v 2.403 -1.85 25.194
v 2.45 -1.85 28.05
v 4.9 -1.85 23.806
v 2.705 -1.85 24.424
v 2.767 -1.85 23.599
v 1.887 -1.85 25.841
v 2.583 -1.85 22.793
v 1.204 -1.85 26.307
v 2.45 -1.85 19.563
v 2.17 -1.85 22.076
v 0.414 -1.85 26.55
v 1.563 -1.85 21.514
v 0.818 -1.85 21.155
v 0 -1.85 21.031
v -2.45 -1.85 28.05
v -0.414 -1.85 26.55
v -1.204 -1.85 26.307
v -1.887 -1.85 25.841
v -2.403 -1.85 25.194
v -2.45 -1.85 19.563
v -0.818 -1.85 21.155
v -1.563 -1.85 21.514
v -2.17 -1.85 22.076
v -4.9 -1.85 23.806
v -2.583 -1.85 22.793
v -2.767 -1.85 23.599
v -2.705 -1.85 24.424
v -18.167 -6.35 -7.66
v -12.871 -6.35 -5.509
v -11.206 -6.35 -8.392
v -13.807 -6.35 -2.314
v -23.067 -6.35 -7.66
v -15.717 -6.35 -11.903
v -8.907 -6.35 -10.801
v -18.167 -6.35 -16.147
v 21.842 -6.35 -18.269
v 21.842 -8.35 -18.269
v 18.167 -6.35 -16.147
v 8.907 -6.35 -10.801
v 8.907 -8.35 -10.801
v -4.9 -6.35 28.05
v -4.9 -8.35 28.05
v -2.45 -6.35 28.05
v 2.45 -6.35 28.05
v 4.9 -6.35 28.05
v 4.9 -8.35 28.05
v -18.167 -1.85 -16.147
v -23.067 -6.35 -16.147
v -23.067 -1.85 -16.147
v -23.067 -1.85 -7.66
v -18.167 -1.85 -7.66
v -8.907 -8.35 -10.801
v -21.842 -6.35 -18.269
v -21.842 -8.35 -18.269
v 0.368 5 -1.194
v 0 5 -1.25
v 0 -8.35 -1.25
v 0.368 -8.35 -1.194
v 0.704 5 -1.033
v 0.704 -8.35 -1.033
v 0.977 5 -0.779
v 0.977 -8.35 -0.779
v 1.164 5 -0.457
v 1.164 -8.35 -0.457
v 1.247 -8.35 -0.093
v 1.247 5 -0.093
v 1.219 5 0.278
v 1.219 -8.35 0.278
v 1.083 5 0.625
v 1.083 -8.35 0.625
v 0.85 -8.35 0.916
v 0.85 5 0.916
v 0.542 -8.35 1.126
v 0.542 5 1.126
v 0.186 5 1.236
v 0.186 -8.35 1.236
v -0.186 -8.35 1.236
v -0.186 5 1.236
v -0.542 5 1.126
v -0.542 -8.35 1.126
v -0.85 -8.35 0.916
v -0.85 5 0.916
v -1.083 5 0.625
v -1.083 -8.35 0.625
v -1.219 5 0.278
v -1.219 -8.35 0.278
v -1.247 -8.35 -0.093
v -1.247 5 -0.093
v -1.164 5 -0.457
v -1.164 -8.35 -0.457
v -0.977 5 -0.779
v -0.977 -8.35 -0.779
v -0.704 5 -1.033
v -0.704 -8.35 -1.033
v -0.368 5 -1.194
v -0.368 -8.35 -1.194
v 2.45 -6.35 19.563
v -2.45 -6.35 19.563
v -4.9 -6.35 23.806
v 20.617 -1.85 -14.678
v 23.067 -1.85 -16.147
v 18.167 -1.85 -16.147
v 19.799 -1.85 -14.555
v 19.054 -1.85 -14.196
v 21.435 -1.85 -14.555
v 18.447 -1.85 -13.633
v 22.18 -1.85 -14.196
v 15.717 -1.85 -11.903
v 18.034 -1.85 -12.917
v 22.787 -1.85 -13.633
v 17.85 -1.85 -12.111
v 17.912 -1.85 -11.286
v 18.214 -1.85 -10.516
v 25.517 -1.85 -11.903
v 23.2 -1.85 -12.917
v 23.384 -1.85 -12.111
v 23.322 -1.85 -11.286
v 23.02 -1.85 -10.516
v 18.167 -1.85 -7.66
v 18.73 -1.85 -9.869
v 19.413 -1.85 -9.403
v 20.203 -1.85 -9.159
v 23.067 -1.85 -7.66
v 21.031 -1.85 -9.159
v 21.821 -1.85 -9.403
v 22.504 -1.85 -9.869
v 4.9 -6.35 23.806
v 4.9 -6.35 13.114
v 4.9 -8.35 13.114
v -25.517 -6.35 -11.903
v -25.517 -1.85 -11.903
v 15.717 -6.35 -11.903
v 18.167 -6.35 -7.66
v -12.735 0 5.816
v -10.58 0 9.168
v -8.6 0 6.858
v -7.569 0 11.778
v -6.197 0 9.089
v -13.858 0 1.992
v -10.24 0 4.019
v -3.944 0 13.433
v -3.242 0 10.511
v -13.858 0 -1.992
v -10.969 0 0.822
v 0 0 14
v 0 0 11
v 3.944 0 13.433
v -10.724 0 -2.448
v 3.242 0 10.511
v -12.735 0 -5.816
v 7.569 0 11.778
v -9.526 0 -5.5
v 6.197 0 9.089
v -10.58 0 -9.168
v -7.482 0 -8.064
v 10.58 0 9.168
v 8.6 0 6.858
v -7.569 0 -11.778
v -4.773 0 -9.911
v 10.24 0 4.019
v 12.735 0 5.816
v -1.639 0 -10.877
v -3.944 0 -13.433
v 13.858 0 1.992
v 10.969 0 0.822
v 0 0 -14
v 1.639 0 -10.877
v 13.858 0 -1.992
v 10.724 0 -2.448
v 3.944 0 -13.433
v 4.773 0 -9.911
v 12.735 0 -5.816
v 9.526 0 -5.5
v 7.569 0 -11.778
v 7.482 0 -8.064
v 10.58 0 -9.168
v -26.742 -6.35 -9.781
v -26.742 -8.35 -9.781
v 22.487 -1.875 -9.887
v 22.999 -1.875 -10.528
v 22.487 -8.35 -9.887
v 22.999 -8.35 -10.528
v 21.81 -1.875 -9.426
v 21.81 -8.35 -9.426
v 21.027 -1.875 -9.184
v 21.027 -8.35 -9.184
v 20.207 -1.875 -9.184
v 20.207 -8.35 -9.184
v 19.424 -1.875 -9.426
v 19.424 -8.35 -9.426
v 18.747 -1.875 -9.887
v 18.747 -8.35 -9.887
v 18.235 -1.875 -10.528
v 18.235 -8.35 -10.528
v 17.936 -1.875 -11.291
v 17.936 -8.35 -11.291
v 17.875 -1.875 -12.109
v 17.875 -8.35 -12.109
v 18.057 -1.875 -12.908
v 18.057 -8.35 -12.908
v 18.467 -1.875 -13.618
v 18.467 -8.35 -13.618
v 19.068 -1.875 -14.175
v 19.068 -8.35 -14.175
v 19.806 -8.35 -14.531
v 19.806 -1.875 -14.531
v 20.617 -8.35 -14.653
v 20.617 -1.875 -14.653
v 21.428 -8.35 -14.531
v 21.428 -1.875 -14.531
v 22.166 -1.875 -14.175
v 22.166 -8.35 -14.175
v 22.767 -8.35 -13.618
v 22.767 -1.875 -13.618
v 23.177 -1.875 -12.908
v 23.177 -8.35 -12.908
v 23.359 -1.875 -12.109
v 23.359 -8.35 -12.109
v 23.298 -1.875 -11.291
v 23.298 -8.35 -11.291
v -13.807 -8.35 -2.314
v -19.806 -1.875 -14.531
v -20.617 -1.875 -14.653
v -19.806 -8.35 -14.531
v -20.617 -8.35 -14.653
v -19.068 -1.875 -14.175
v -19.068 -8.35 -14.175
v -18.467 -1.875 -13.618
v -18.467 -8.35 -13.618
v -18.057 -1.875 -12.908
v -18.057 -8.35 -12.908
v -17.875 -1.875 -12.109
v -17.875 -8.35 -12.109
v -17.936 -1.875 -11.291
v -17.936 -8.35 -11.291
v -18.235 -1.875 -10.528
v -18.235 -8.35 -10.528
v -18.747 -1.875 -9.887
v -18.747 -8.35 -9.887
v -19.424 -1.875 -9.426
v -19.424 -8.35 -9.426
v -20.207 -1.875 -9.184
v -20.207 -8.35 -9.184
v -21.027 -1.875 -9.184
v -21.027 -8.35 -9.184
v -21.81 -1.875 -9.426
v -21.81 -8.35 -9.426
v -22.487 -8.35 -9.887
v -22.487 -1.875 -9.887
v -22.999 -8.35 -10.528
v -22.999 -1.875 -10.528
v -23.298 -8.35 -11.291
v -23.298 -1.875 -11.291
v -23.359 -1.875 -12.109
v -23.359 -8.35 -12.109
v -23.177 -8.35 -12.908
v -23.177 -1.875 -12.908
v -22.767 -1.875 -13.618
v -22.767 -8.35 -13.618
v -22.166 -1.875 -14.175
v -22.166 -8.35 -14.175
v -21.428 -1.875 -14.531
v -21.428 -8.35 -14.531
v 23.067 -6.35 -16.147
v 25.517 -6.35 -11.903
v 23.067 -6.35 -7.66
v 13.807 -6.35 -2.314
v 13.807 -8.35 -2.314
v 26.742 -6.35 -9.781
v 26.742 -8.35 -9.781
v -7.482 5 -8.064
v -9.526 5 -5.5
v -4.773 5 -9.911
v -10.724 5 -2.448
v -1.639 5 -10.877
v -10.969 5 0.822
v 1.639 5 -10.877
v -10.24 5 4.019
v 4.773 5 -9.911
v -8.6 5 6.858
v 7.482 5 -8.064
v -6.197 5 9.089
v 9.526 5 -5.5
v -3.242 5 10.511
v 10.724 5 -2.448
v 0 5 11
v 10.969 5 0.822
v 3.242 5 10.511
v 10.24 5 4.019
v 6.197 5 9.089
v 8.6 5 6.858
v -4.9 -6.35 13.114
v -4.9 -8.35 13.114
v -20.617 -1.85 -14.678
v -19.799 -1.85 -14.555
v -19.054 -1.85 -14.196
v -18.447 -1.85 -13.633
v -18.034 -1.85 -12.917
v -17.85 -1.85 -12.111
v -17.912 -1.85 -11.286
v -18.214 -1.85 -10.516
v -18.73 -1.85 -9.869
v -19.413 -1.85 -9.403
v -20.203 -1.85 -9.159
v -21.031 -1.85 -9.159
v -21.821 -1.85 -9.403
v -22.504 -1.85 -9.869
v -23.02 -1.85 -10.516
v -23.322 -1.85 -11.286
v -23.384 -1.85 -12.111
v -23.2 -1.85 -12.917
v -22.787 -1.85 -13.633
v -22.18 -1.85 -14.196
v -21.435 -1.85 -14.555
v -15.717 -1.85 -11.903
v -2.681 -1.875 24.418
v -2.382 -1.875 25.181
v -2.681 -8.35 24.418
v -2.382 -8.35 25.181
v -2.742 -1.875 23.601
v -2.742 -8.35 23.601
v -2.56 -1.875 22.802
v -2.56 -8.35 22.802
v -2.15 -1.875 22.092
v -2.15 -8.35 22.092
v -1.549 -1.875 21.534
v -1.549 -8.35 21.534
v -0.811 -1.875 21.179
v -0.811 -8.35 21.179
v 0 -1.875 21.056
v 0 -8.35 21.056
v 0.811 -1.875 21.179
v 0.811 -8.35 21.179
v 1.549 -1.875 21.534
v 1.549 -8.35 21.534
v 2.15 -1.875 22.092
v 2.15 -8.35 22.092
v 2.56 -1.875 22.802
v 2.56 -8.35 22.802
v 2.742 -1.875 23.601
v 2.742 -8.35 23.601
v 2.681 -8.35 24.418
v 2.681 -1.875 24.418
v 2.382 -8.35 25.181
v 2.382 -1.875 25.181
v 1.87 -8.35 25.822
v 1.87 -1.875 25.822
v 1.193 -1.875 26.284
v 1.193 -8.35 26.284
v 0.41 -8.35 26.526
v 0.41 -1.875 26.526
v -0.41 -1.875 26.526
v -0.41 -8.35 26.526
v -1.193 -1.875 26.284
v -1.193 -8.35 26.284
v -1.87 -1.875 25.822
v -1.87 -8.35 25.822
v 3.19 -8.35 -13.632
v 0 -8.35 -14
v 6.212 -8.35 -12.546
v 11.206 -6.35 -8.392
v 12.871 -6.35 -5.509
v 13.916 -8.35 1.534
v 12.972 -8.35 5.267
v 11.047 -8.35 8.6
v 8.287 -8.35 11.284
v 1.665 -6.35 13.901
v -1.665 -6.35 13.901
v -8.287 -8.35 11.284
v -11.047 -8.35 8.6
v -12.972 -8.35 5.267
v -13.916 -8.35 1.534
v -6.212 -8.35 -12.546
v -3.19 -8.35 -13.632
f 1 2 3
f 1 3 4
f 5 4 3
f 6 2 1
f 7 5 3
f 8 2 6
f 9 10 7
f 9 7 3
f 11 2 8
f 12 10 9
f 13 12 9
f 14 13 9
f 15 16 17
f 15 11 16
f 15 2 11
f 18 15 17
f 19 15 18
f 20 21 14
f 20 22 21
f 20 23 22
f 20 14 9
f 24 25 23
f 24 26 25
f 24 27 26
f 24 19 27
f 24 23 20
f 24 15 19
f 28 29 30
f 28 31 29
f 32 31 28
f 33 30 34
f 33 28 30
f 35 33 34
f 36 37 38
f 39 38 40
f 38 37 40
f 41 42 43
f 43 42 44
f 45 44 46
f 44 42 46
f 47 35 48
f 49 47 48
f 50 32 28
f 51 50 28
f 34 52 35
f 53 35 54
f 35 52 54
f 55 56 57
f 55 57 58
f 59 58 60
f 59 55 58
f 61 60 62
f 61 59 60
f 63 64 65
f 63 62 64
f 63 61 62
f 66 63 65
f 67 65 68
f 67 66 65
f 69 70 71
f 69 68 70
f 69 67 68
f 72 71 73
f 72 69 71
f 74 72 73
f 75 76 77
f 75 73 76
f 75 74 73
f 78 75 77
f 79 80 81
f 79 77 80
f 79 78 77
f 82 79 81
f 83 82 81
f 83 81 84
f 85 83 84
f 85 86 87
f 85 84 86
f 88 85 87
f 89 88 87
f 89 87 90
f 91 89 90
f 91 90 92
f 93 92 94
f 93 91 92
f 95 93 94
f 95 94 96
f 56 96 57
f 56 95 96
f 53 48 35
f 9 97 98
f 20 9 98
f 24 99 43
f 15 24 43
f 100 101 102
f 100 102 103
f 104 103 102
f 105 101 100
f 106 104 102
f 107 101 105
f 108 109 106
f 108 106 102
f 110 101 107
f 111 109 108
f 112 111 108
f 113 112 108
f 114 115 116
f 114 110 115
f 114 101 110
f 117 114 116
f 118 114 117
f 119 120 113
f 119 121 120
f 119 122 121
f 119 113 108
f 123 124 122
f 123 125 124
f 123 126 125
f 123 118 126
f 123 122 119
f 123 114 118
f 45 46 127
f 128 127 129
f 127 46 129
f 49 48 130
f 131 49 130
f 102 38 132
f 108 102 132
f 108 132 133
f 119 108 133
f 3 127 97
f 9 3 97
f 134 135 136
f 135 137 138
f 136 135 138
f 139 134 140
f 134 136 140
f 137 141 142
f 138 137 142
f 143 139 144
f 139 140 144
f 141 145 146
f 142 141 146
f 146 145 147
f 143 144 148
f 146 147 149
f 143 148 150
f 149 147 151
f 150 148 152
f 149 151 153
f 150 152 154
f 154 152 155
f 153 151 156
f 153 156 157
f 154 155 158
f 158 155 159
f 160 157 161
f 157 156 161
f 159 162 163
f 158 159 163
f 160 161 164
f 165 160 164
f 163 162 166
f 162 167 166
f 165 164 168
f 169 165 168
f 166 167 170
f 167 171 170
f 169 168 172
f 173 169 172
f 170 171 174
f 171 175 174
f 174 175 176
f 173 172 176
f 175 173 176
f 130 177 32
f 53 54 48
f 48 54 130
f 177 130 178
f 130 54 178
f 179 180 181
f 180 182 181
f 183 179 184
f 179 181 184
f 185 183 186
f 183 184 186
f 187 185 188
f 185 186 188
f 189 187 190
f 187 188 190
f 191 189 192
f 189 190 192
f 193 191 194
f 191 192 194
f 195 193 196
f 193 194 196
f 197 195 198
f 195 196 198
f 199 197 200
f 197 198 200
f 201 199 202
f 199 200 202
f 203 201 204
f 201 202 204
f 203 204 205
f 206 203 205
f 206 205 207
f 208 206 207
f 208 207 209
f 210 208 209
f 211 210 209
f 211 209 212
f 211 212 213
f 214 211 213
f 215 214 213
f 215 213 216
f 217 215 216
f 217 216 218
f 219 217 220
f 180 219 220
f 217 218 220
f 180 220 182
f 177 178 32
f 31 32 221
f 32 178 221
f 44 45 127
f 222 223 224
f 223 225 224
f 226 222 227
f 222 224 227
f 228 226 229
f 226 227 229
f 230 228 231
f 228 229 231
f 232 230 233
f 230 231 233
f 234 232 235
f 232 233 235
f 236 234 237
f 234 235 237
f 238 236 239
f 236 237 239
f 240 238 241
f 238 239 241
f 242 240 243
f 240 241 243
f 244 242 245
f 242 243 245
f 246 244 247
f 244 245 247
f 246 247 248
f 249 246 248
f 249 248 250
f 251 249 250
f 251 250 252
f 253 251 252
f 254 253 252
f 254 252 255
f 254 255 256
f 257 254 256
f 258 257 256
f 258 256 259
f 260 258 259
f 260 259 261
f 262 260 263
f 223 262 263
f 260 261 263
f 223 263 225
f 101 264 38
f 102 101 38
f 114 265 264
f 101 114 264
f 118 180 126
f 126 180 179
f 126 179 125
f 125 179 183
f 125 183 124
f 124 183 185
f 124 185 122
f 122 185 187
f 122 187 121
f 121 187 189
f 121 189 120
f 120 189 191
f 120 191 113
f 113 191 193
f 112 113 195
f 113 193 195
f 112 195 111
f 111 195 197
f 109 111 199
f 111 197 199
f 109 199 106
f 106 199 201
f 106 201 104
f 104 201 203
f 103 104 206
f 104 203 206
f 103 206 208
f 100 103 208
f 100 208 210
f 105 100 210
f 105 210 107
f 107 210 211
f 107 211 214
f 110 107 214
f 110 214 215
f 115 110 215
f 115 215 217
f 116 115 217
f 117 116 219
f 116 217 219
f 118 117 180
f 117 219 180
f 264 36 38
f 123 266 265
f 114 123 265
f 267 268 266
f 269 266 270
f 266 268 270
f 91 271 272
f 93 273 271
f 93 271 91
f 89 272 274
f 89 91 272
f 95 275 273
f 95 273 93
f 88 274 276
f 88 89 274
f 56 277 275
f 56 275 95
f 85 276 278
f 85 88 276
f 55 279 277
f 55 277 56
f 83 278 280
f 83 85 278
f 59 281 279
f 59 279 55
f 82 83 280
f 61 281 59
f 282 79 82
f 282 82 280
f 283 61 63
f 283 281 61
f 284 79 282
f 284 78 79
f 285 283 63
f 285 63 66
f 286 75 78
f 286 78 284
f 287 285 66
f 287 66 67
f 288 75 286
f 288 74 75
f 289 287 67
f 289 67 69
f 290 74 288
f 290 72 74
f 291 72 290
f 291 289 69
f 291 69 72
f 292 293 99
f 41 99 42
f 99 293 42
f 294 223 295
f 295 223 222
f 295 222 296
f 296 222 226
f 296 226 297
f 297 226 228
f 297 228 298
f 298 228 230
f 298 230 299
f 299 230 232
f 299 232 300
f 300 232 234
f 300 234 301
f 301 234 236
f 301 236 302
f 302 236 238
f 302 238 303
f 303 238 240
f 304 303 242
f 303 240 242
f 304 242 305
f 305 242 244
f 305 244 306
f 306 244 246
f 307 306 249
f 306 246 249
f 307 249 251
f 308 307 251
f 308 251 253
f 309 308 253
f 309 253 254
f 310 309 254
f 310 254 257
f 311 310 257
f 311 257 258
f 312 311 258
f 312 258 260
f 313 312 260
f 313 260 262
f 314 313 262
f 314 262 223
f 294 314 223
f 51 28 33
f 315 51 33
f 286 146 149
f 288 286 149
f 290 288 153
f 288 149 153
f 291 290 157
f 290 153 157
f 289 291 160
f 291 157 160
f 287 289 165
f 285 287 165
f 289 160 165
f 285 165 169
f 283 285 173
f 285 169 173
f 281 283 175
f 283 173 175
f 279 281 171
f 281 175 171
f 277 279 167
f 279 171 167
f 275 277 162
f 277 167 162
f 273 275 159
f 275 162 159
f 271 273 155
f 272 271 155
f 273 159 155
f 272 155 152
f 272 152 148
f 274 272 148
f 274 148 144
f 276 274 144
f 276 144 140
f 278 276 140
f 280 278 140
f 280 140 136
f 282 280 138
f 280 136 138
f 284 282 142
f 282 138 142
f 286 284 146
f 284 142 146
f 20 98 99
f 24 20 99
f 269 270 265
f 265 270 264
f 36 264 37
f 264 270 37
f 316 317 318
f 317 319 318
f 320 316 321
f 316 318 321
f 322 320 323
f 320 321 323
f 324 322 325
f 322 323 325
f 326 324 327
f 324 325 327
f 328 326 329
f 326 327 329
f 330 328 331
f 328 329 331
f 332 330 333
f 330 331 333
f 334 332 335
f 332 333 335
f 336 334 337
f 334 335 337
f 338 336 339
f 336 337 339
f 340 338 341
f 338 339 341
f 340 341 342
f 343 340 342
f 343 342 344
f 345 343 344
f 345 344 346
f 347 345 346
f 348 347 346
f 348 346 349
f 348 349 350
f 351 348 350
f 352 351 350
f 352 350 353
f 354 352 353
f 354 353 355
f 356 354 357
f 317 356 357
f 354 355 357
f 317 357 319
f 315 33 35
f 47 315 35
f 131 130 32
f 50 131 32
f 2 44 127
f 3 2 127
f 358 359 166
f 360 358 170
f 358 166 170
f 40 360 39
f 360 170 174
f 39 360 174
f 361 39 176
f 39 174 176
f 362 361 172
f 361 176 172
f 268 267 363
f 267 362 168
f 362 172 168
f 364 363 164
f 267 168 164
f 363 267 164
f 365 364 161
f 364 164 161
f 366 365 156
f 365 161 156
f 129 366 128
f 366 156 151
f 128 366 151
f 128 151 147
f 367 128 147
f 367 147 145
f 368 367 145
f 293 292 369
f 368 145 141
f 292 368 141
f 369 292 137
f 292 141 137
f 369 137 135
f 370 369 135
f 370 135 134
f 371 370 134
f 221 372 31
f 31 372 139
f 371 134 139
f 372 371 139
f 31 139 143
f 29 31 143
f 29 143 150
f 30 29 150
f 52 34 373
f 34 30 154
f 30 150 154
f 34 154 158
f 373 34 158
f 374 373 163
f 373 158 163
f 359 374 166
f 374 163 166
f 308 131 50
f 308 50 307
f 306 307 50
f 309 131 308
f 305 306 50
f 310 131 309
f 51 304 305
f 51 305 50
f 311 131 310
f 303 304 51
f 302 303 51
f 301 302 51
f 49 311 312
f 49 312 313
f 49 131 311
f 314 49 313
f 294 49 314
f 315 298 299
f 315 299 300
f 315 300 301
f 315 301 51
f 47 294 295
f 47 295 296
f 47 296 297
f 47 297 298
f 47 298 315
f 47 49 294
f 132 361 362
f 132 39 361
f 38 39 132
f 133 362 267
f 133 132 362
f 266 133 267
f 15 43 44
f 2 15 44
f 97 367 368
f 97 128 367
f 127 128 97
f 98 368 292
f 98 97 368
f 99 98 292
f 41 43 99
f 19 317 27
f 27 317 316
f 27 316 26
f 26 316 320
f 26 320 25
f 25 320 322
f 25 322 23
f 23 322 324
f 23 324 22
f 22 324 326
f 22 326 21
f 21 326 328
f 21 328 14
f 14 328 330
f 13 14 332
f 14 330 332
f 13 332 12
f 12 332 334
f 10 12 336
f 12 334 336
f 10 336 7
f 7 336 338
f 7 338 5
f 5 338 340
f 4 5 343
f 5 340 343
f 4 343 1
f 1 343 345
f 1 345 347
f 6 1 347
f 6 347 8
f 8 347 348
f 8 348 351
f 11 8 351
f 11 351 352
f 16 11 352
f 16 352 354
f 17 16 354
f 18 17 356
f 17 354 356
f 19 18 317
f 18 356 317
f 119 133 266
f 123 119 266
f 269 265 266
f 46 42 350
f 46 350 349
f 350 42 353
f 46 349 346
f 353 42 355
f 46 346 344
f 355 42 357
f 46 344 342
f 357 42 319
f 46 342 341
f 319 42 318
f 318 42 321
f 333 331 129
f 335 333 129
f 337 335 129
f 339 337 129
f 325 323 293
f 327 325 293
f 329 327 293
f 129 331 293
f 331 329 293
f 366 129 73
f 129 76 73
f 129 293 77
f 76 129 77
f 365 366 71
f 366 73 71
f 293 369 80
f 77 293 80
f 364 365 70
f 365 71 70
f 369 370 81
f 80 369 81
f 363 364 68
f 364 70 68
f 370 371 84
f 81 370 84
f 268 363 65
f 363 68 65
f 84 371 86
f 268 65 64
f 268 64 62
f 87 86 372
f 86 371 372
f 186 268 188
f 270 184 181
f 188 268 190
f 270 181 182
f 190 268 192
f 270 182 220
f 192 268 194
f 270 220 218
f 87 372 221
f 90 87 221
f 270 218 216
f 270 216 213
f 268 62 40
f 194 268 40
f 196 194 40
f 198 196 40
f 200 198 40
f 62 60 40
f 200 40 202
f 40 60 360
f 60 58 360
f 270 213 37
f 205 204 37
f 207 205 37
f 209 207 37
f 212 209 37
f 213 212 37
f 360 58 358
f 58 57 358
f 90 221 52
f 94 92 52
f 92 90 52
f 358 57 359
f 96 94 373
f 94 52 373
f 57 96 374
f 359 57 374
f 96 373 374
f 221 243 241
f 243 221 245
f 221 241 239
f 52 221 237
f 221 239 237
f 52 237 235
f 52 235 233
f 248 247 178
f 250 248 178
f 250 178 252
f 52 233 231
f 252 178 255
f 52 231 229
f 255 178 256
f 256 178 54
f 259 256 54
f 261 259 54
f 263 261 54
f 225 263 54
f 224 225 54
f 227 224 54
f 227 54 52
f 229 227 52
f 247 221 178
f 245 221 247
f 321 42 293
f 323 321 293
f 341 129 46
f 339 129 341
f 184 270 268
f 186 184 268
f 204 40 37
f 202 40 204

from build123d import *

# Parameters (mm, degrees)
ESQUISSE1_R                  = 11
BOSS_EXTRU_1_DEPTH           = 5
ESQUISSE3_R                  = 14
BOSS_EXTRU_3_DEPTH           = 8.35
ENL_V_MAT_EXTRU_1_DEPTH      = 24.879332068
ENL_V_MAT_EXTRU_1_DEPTH_BACK = 24.879332068
ESQUISSE5_R                  = 1.25
BOSS_EXTRU_6_DEPTH           = 2
R_P_TITION_CIRCULAIRE1_COUNT = 3
BOSS_EXTRU_8_DEPTH           = 4.5
R_P_TITION_CIRCULAIRE3_COUNT = 3
D_GAGEMENT_M51_D             = 5.5
D_GAGEMENT_M51_CSINK_D       = 5.55
D_GAGEMENT_M51_CSINK_ANGLE   = 90
R_P_TITION_CIRCULAIRE4_COUNT = 3


with BuildPart() as part:
    # Esquisse1 → Boss.-Extru.1 (new body)
    with BuildSketch(Plane(origin=(0, 0, 0), x_dir=(1, 0, 0), z_dir=(0, 1, 0))):
        with Locations(Location((0, 0, 0), (0, 0, 270))):
            Circle(ESQUISSE1_R)
    extrude(amount=BOSS_EXTRU_1_DEPTH)

    # Esquisse3 → Boss.-Extru.3 (add)
    with BuildSketch(Plane.XZ):
        with Locations(Location((0, 0, 0), (0, 0, 270))):
            Circle(ESQUISSE3_R)
    extrude(amount=BOSS_EXTRU_3_DEPTH)

    # Esquisse5 → Enlèv. mat.-Extru.1 (cut, two sides: drawn at the far end of the back side and taken through both)
    with BuildSketch(Plane.XZ.offset(8.35).offset(-ENL_V_MAT_EXTRU_1_DEPTH_BACK)):
        with Locations(Location((0, 0, 0), (0, 0, 270))):
            Circle(ESQUISSE5_R)
    extrude(amount=ENL_V_MAT_EXTRU_1_DEPTH + ENL_V_MAT_EXTRU_1_DEPTH_BACK, mode=Mode.SUBTRACT)

    # Esquisse8 → Boss.-Extru.6 (add)
    with BuildSketch(Plane.XZ.offset(8.35)):
        with BuildLine():
            Line((-4.9, 28.05), (4.9, 28.05))
            Line((4.9, 28.05), (4.9, 5.678027827))
            ThreePointArc((4.9, 5.678027827), (0, 7.5), (-4.9, 5.678027827))
            Line((-4.9, 5.678027827), (-4.9, 28.05))
        make_face()
    boss_extru_6 = extrude(amount=-BOSS_EXTRU_6_DEPTH)

    # Répétition circulaire1: Boss.-Extru.6 ×3 about axis
    r_p_tition_circulaire1_axis = Axis((0, 0, 0), (0, 1, 0))
    for i in range(1, R_P_TITION_CIRCULAIRE1_COUNT):
        add(boss_extru_6.rotate(r_p_tition_circulaire1_axis, i * 360 / R_P_TITION_CIRCULAIRE1_COUNT))

    # Esquisse13 → Boss.-Extru.8 (add)
    with BuildSketch(Plane(origin=(0, -6.35, 0), x_dir=(1, 0, 0), z_dir=(0, 1, 0))):
        Polygon((-23.067012576, 16.146762239), (-25.517012576, 11.903237761), (-23.067012576, 7.659713282), (-18.167012576, 7.659713282), (-15.717012576, 11.903237761), (-18.167012576, 16.146762239), align=None)
    boss_extru_8 = extrude(amount=BOSS_EXTRU_8_DEPTH)

    # Répétition circulaire3: Boss.-Extru.8 ×3 about axis
    r_p_tition_circulaire3_axis = Axis((0, 0, 0), (0, 1, 0))
    for i in range(1, R_P_TITION_CIRCULAIRE3_COUNT):
        add(boss_extru_8.rotate(r_p_tition_circulaire3_axis, i * 360 / R_P_TITION_CIRCULAIRE3_COUNT))

    # Dégagement M51 (through all)
    with Locations(Plane(origin=(-20.617012576, -1.85, -11.903237761), x_dir=(0, 0, 1), z_dir=(0, 1, 0))):
        with Locations((0, 0)):
            d_gagement_m51 = CounterSinkHole(D_GAGEMENT_M51_D / 2, D_GAGEMENT_M51_CSINK_D / 2, counter_sink_angle=D_GAGEMENT_M51_CSINK_ANGLE)

    # Répétition circulaire4: Dégagement M51 ×3 about axis
    r_p_tition_circulaire4_axis = Axis((0, 0, 0), (0, 1, 0))
    for i in range(1, R_P_TITION_CIRCULAIRE4_COUNT):
        add(d_gagement_m51.rotate(r_p_tition_circulaire4_axis, i * 360 / R_P_TITION_CIRCULAIRE4_COUNT), mode=Mode.SUBTRACT)


solid = part.part
